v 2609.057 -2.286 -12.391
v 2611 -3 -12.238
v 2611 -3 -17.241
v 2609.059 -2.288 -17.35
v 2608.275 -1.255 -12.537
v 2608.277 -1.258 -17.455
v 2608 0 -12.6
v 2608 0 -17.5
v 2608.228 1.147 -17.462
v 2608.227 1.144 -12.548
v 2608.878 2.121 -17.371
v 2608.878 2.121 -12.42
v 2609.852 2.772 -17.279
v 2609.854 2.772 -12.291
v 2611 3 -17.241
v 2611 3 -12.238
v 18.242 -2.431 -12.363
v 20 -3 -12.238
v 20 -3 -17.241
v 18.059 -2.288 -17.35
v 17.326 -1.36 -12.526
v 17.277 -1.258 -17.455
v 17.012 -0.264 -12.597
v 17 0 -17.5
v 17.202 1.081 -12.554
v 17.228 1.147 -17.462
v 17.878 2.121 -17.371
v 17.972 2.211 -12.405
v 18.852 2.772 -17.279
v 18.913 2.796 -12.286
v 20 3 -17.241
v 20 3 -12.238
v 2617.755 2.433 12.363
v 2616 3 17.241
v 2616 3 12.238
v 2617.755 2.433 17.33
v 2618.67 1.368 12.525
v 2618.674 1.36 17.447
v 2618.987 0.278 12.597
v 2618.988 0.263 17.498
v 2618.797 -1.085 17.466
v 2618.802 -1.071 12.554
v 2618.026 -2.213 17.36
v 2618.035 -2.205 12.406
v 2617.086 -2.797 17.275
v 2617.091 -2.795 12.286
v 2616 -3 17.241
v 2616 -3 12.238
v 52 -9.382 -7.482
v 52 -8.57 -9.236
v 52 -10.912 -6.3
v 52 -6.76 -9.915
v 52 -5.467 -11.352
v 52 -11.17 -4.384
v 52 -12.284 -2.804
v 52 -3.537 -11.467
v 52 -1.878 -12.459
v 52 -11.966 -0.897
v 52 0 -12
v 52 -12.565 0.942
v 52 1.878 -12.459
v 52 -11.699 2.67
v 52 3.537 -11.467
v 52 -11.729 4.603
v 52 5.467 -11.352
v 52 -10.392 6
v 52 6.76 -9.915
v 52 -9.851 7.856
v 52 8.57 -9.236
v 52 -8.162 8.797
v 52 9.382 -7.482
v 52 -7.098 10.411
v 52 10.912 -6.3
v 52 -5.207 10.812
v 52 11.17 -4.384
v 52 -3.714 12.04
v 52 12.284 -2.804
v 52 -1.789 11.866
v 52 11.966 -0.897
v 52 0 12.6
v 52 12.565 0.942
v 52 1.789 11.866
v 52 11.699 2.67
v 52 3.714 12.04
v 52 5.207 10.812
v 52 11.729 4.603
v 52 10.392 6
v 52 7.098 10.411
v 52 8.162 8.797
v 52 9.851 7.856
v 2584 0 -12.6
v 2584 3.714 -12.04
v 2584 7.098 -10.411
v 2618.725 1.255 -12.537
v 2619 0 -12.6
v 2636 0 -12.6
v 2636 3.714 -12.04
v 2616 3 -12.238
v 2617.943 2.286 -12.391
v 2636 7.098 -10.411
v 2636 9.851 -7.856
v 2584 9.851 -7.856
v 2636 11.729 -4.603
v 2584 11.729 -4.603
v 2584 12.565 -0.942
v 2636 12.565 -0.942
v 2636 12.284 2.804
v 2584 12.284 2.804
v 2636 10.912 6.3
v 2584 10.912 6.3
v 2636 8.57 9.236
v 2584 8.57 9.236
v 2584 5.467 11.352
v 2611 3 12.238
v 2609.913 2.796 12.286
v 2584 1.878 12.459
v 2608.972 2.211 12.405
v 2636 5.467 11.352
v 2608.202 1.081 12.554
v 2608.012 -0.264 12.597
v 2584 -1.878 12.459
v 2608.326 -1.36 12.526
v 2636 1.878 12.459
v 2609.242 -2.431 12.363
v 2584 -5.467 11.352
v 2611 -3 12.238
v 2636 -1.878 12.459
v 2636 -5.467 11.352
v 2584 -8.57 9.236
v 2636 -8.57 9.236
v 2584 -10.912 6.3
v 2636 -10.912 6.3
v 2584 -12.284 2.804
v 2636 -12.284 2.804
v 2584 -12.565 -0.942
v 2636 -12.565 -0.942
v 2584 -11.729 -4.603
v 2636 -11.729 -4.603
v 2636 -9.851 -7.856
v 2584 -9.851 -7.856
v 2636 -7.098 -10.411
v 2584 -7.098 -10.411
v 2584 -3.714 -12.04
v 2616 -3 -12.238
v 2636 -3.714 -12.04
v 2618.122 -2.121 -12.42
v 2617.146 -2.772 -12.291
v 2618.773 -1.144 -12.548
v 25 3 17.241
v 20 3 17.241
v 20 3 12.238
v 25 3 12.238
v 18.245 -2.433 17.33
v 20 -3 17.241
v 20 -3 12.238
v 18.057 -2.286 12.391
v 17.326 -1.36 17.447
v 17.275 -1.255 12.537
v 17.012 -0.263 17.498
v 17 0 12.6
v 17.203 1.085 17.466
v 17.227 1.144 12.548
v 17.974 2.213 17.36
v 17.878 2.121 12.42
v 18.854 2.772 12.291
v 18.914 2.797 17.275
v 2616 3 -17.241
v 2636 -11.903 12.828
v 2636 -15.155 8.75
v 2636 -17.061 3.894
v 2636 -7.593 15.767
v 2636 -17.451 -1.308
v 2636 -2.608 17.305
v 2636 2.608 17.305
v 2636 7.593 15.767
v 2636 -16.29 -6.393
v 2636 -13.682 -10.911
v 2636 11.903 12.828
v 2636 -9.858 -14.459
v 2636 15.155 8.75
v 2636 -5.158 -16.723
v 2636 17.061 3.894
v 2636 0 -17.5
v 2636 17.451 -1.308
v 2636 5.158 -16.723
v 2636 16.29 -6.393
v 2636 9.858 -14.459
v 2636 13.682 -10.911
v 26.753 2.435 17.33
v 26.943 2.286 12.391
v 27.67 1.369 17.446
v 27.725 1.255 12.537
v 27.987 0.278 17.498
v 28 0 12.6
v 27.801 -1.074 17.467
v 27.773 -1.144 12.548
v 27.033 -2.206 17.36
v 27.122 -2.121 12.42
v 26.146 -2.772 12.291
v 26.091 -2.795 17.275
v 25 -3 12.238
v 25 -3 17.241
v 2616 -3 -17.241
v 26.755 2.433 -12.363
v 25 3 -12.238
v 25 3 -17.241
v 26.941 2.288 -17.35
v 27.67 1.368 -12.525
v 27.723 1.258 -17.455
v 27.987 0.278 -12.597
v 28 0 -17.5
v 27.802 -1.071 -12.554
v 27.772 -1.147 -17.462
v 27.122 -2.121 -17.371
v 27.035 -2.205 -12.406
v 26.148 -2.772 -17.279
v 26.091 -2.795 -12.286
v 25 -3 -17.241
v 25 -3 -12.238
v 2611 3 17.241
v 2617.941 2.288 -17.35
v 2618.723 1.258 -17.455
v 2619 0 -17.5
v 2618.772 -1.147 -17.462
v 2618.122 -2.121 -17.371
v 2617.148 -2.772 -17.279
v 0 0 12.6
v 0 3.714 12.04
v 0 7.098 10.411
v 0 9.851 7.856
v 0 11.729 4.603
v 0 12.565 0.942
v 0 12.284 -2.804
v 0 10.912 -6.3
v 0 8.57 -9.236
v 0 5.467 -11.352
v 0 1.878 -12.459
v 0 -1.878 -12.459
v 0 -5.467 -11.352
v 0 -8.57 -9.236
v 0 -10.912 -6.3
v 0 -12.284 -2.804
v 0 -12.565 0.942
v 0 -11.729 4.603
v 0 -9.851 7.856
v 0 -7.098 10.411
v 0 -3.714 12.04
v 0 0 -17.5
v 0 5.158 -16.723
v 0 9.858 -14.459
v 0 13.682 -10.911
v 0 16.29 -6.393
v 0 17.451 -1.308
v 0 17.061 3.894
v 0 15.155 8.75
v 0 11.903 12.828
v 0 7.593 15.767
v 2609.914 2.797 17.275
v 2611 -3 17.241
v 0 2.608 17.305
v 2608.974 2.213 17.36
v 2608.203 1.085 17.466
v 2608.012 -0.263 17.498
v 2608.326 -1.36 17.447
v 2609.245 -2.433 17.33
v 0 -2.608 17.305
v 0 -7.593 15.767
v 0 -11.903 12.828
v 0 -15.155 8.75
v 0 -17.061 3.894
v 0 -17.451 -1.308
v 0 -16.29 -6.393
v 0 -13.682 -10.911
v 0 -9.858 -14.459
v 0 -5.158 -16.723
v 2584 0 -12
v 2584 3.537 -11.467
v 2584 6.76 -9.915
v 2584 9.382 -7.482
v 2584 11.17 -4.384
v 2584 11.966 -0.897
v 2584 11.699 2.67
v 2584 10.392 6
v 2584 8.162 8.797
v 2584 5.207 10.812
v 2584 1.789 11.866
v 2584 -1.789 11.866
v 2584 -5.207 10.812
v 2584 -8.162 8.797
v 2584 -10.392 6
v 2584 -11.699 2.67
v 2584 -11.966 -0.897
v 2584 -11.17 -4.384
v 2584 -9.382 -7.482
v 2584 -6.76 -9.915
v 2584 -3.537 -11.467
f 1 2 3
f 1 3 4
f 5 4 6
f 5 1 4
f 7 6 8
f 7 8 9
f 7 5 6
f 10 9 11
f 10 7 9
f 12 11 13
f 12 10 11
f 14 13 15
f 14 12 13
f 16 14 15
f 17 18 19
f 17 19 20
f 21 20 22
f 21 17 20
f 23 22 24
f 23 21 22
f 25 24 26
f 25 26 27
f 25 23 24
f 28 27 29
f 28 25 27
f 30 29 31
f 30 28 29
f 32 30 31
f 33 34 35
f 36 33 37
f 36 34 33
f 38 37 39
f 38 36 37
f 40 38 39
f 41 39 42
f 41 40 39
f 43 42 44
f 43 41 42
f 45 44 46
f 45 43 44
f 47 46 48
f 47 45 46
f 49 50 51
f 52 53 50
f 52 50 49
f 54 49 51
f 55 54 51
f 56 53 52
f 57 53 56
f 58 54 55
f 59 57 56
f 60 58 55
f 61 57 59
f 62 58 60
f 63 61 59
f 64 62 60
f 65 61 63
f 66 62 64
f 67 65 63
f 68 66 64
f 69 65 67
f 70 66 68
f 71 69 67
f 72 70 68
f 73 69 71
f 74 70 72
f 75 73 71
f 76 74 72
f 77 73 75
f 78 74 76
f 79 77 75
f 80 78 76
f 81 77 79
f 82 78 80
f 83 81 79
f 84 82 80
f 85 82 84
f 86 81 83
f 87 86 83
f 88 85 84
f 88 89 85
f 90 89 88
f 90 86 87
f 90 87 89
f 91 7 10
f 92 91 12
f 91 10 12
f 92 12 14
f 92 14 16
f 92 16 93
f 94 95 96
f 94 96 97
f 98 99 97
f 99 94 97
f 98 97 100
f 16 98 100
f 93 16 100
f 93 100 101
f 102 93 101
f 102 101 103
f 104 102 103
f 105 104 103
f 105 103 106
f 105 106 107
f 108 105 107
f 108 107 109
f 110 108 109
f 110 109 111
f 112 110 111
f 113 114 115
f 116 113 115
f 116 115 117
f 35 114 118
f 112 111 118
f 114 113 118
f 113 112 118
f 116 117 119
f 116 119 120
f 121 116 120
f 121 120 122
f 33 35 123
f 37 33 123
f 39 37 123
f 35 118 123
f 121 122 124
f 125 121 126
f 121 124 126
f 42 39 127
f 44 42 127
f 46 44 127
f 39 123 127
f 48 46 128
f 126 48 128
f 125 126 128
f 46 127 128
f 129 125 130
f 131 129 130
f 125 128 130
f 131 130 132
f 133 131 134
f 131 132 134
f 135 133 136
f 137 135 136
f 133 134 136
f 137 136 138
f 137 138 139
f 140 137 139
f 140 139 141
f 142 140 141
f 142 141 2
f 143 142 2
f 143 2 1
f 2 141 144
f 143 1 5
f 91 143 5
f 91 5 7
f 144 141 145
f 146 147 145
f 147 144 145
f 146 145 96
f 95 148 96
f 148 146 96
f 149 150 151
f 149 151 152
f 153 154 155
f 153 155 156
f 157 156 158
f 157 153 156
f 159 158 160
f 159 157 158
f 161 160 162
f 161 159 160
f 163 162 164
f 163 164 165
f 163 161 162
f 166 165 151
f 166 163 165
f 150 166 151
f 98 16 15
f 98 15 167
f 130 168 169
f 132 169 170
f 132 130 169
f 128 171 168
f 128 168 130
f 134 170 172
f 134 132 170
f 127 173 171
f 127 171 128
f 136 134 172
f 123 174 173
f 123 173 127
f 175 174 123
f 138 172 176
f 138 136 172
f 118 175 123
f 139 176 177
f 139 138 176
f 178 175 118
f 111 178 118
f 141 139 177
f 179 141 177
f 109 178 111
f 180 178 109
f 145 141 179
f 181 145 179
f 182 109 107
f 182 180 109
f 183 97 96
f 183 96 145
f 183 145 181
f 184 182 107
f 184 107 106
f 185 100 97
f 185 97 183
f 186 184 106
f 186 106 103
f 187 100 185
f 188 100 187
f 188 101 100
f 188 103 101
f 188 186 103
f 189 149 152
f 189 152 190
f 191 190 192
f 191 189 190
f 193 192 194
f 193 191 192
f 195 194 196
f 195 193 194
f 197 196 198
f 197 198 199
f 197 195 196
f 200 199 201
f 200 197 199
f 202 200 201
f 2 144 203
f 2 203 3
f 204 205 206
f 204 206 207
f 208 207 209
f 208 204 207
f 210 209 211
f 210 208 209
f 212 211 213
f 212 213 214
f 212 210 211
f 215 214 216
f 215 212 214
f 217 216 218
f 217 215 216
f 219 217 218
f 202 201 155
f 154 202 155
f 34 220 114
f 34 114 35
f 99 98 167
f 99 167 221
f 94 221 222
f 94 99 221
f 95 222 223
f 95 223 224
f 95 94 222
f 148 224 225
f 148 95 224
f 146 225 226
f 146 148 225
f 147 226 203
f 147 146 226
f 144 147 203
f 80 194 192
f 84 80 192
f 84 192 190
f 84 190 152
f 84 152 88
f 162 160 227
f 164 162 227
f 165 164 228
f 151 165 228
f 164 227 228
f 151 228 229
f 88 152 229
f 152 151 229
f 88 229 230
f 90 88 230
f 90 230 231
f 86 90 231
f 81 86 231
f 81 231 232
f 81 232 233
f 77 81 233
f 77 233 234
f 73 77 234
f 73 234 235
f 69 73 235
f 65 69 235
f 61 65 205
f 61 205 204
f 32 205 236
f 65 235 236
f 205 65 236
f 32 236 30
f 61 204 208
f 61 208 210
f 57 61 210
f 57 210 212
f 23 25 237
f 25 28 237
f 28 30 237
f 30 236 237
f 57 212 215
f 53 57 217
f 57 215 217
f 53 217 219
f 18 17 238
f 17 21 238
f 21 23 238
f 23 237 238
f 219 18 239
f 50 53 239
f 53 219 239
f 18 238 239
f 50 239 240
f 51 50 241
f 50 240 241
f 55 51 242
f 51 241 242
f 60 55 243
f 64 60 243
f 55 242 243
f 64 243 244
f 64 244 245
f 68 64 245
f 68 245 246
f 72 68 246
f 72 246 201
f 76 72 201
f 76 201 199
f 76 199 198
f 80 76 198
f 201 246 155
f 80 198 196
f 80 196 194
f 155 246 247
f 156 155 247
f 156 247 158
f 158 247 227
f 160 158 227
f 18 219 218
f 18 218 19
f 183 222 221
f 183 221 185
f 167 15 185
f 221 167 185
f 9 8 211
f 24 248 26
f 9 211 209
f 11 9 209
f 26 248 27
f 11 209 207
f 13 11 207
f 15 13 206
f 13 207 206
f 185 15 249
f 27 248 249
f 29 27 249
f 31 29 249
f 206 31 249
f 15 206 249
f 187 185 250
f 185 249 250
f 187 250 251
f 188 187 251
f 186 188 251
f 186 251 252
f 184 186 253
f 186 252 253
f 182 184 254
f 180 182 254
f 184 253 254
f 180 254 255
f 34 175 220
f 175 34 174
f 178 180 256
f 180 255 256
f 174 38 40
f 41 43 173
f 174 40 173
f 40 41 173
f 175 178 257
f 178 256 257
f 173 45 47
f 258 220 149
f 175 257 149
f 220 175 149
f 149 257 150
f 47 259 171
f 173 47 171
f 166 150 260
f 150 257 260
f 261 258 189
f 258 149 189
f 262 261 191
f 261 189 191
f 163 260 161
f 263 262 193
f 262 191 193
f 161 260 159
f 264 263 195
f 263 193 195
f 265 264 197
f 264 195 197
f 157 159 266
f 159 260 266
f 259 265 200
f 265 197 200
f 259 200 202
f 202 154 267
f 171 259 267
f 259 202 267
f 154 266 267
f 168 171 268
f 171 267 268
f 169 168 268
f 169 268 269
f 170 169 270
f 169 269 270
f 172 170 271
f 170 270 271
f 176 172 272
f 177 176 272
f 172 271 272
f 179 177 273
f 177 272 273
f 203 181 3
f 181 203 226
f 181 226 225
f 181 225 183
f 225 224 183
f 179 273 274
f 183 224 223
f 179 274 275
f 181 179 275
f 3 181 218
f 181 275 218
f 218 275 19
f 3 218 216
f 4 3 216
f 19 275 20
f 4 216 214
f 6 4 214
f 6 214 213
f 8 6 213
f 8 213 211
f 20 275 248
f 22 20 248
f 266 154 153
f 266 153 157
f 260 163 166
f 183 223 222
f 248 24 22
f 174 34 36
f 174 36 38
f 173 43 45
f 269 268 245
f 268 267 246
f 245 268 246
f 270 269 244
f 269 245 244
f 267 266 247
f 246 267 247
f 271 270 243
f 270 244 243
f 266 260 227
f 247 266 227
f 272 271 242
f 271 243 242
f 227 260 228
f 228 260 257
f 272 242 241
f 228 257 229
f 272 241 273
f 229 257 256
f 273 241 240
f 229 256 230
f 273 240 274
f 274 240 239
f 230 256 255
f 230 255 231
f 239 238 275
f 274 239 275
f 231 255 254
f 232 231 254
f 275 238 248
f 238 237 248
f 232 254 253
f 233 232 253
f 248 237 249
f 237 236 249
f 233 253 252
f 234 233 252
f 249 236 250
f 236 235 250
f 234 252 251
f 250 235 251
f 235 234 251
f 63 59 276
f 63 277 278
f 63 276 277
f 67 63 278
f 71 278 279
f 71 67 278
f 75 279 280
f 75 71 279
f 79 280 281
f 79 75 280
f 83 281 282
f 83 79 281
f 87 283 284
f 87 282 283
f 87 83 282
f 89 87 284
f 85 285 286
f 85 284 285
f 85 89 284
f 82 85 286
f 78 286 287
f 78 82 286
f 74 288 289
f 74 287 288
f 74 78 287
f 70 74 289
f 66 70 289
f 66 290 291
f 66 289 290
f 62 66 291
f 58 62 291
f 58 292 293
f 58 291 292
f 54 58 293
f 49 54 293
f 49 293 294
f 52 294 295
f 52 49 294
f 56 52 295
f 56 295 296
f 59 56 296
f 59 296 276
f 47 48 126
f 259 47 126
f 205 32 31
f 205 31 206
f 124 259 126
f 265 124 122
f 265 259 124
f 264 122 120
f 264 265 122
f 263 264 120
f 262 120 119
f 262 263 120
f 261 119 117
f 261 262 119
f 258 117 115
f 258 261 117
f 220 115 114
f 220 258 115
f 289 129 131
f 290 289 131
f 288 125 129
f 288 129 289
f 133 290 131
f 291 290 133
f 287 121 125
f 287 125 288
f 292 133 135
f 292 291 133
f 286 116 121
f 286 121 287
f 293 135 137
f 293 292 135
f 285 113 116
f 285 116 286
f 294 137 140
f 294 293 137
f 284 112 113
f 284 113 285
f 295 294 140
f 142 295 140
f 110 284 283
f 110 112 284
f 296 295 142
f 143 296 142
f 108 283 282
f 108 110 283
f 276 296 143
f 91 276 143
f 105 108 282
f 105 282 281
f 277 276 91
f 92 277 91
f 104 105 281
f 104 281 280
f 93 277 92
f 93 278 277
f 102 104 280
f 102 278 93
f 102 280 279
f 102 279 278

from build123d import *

# Parameters (mm, degrees)
SKETCH_1_R          = 17.5
SKETCH_1_R_2        = 12
EXTRUDE_1_DEPTH     = 2636
SKETCH_2_R          = 12.6
CUT_EXTRUDE_1_DEPTH = 52
SKETCH_3_R          = 12.6
CUT_EXTRUDE_2_DEPTH = 52
CUT_EXTRUDE_3_DEPTH = 20
CUT_EXTRUDE_4_DEPTH = 20


with BuildPart() as part:
    # 草图1 → 凸台-拉伸1 (new body)
    with BuildSketch(Plane(origin=(0, 0, 0), x_dir=(0, 0, -1), z_dir=(1, 0, 0))):
        Circle(SKETCH_1_R)
        Circle(SKETCH_1_R_2, mode=Mode.SUBTRACT)
    extrude(amount=EXTRUDE_1_DEPTH)

    # 草图2 → 切除-拉伸1 (cut)
    with BuildSketch(Plane.ZY):
        Circle(SKETCH_2_R)
    extrude(amount=-CUT_EXTRUDE_1_DEPTH, mode=Mode.SUBTRACT)

    # 草图3 → 切除-拉伸2 (cut)
    with BuildSketch(Plane(origin=(2636, 0, 0), x_dir=(0, 0, -1), z_dir=(1, 0, 0))):
        Circle(SKETCH_3_R)
    extrude(amount=-CUT_EXTRUDE_2_DEPTH, mode=Mode.SUBTRACT)

    # 草图4 → 切除-拉伸3 (cut, symmetric)
    with BuildSketch(Plane.XY):
        with BuildLine():
            Line((20, 3), (25, 3))
            ThreePointArc((25, 3), (28, 0), (25, -3))
            Line((25, -3), (20, -3))
            ThreePointArc((20, -3), (17, 0), (20, 3))
        make_face()
    extrude(amount=CUT_EXTRUDE_3_DEPTH, both=True, mode=Mode.SUBTRACT)

    # 草图5 → 切除-拉伸4 (cut, symmetric)
    with BuildSketch(Plane.XY):
        with BuildLine():
            Line((2611, 3), (2616, 3))
            ThreePointArc((2616, 3), (2619, 0), (2616, -3))
            Line((2616, -3), (2611, -3))
            ThreePointArc((2611, -3), (2608, 0), (2611, 3))
        make_face()
    extrude(amount=CUT_EXTRUDE_4_DEPTH, both=True, mode=Mode.SUBTRACT)


solid = part.part
